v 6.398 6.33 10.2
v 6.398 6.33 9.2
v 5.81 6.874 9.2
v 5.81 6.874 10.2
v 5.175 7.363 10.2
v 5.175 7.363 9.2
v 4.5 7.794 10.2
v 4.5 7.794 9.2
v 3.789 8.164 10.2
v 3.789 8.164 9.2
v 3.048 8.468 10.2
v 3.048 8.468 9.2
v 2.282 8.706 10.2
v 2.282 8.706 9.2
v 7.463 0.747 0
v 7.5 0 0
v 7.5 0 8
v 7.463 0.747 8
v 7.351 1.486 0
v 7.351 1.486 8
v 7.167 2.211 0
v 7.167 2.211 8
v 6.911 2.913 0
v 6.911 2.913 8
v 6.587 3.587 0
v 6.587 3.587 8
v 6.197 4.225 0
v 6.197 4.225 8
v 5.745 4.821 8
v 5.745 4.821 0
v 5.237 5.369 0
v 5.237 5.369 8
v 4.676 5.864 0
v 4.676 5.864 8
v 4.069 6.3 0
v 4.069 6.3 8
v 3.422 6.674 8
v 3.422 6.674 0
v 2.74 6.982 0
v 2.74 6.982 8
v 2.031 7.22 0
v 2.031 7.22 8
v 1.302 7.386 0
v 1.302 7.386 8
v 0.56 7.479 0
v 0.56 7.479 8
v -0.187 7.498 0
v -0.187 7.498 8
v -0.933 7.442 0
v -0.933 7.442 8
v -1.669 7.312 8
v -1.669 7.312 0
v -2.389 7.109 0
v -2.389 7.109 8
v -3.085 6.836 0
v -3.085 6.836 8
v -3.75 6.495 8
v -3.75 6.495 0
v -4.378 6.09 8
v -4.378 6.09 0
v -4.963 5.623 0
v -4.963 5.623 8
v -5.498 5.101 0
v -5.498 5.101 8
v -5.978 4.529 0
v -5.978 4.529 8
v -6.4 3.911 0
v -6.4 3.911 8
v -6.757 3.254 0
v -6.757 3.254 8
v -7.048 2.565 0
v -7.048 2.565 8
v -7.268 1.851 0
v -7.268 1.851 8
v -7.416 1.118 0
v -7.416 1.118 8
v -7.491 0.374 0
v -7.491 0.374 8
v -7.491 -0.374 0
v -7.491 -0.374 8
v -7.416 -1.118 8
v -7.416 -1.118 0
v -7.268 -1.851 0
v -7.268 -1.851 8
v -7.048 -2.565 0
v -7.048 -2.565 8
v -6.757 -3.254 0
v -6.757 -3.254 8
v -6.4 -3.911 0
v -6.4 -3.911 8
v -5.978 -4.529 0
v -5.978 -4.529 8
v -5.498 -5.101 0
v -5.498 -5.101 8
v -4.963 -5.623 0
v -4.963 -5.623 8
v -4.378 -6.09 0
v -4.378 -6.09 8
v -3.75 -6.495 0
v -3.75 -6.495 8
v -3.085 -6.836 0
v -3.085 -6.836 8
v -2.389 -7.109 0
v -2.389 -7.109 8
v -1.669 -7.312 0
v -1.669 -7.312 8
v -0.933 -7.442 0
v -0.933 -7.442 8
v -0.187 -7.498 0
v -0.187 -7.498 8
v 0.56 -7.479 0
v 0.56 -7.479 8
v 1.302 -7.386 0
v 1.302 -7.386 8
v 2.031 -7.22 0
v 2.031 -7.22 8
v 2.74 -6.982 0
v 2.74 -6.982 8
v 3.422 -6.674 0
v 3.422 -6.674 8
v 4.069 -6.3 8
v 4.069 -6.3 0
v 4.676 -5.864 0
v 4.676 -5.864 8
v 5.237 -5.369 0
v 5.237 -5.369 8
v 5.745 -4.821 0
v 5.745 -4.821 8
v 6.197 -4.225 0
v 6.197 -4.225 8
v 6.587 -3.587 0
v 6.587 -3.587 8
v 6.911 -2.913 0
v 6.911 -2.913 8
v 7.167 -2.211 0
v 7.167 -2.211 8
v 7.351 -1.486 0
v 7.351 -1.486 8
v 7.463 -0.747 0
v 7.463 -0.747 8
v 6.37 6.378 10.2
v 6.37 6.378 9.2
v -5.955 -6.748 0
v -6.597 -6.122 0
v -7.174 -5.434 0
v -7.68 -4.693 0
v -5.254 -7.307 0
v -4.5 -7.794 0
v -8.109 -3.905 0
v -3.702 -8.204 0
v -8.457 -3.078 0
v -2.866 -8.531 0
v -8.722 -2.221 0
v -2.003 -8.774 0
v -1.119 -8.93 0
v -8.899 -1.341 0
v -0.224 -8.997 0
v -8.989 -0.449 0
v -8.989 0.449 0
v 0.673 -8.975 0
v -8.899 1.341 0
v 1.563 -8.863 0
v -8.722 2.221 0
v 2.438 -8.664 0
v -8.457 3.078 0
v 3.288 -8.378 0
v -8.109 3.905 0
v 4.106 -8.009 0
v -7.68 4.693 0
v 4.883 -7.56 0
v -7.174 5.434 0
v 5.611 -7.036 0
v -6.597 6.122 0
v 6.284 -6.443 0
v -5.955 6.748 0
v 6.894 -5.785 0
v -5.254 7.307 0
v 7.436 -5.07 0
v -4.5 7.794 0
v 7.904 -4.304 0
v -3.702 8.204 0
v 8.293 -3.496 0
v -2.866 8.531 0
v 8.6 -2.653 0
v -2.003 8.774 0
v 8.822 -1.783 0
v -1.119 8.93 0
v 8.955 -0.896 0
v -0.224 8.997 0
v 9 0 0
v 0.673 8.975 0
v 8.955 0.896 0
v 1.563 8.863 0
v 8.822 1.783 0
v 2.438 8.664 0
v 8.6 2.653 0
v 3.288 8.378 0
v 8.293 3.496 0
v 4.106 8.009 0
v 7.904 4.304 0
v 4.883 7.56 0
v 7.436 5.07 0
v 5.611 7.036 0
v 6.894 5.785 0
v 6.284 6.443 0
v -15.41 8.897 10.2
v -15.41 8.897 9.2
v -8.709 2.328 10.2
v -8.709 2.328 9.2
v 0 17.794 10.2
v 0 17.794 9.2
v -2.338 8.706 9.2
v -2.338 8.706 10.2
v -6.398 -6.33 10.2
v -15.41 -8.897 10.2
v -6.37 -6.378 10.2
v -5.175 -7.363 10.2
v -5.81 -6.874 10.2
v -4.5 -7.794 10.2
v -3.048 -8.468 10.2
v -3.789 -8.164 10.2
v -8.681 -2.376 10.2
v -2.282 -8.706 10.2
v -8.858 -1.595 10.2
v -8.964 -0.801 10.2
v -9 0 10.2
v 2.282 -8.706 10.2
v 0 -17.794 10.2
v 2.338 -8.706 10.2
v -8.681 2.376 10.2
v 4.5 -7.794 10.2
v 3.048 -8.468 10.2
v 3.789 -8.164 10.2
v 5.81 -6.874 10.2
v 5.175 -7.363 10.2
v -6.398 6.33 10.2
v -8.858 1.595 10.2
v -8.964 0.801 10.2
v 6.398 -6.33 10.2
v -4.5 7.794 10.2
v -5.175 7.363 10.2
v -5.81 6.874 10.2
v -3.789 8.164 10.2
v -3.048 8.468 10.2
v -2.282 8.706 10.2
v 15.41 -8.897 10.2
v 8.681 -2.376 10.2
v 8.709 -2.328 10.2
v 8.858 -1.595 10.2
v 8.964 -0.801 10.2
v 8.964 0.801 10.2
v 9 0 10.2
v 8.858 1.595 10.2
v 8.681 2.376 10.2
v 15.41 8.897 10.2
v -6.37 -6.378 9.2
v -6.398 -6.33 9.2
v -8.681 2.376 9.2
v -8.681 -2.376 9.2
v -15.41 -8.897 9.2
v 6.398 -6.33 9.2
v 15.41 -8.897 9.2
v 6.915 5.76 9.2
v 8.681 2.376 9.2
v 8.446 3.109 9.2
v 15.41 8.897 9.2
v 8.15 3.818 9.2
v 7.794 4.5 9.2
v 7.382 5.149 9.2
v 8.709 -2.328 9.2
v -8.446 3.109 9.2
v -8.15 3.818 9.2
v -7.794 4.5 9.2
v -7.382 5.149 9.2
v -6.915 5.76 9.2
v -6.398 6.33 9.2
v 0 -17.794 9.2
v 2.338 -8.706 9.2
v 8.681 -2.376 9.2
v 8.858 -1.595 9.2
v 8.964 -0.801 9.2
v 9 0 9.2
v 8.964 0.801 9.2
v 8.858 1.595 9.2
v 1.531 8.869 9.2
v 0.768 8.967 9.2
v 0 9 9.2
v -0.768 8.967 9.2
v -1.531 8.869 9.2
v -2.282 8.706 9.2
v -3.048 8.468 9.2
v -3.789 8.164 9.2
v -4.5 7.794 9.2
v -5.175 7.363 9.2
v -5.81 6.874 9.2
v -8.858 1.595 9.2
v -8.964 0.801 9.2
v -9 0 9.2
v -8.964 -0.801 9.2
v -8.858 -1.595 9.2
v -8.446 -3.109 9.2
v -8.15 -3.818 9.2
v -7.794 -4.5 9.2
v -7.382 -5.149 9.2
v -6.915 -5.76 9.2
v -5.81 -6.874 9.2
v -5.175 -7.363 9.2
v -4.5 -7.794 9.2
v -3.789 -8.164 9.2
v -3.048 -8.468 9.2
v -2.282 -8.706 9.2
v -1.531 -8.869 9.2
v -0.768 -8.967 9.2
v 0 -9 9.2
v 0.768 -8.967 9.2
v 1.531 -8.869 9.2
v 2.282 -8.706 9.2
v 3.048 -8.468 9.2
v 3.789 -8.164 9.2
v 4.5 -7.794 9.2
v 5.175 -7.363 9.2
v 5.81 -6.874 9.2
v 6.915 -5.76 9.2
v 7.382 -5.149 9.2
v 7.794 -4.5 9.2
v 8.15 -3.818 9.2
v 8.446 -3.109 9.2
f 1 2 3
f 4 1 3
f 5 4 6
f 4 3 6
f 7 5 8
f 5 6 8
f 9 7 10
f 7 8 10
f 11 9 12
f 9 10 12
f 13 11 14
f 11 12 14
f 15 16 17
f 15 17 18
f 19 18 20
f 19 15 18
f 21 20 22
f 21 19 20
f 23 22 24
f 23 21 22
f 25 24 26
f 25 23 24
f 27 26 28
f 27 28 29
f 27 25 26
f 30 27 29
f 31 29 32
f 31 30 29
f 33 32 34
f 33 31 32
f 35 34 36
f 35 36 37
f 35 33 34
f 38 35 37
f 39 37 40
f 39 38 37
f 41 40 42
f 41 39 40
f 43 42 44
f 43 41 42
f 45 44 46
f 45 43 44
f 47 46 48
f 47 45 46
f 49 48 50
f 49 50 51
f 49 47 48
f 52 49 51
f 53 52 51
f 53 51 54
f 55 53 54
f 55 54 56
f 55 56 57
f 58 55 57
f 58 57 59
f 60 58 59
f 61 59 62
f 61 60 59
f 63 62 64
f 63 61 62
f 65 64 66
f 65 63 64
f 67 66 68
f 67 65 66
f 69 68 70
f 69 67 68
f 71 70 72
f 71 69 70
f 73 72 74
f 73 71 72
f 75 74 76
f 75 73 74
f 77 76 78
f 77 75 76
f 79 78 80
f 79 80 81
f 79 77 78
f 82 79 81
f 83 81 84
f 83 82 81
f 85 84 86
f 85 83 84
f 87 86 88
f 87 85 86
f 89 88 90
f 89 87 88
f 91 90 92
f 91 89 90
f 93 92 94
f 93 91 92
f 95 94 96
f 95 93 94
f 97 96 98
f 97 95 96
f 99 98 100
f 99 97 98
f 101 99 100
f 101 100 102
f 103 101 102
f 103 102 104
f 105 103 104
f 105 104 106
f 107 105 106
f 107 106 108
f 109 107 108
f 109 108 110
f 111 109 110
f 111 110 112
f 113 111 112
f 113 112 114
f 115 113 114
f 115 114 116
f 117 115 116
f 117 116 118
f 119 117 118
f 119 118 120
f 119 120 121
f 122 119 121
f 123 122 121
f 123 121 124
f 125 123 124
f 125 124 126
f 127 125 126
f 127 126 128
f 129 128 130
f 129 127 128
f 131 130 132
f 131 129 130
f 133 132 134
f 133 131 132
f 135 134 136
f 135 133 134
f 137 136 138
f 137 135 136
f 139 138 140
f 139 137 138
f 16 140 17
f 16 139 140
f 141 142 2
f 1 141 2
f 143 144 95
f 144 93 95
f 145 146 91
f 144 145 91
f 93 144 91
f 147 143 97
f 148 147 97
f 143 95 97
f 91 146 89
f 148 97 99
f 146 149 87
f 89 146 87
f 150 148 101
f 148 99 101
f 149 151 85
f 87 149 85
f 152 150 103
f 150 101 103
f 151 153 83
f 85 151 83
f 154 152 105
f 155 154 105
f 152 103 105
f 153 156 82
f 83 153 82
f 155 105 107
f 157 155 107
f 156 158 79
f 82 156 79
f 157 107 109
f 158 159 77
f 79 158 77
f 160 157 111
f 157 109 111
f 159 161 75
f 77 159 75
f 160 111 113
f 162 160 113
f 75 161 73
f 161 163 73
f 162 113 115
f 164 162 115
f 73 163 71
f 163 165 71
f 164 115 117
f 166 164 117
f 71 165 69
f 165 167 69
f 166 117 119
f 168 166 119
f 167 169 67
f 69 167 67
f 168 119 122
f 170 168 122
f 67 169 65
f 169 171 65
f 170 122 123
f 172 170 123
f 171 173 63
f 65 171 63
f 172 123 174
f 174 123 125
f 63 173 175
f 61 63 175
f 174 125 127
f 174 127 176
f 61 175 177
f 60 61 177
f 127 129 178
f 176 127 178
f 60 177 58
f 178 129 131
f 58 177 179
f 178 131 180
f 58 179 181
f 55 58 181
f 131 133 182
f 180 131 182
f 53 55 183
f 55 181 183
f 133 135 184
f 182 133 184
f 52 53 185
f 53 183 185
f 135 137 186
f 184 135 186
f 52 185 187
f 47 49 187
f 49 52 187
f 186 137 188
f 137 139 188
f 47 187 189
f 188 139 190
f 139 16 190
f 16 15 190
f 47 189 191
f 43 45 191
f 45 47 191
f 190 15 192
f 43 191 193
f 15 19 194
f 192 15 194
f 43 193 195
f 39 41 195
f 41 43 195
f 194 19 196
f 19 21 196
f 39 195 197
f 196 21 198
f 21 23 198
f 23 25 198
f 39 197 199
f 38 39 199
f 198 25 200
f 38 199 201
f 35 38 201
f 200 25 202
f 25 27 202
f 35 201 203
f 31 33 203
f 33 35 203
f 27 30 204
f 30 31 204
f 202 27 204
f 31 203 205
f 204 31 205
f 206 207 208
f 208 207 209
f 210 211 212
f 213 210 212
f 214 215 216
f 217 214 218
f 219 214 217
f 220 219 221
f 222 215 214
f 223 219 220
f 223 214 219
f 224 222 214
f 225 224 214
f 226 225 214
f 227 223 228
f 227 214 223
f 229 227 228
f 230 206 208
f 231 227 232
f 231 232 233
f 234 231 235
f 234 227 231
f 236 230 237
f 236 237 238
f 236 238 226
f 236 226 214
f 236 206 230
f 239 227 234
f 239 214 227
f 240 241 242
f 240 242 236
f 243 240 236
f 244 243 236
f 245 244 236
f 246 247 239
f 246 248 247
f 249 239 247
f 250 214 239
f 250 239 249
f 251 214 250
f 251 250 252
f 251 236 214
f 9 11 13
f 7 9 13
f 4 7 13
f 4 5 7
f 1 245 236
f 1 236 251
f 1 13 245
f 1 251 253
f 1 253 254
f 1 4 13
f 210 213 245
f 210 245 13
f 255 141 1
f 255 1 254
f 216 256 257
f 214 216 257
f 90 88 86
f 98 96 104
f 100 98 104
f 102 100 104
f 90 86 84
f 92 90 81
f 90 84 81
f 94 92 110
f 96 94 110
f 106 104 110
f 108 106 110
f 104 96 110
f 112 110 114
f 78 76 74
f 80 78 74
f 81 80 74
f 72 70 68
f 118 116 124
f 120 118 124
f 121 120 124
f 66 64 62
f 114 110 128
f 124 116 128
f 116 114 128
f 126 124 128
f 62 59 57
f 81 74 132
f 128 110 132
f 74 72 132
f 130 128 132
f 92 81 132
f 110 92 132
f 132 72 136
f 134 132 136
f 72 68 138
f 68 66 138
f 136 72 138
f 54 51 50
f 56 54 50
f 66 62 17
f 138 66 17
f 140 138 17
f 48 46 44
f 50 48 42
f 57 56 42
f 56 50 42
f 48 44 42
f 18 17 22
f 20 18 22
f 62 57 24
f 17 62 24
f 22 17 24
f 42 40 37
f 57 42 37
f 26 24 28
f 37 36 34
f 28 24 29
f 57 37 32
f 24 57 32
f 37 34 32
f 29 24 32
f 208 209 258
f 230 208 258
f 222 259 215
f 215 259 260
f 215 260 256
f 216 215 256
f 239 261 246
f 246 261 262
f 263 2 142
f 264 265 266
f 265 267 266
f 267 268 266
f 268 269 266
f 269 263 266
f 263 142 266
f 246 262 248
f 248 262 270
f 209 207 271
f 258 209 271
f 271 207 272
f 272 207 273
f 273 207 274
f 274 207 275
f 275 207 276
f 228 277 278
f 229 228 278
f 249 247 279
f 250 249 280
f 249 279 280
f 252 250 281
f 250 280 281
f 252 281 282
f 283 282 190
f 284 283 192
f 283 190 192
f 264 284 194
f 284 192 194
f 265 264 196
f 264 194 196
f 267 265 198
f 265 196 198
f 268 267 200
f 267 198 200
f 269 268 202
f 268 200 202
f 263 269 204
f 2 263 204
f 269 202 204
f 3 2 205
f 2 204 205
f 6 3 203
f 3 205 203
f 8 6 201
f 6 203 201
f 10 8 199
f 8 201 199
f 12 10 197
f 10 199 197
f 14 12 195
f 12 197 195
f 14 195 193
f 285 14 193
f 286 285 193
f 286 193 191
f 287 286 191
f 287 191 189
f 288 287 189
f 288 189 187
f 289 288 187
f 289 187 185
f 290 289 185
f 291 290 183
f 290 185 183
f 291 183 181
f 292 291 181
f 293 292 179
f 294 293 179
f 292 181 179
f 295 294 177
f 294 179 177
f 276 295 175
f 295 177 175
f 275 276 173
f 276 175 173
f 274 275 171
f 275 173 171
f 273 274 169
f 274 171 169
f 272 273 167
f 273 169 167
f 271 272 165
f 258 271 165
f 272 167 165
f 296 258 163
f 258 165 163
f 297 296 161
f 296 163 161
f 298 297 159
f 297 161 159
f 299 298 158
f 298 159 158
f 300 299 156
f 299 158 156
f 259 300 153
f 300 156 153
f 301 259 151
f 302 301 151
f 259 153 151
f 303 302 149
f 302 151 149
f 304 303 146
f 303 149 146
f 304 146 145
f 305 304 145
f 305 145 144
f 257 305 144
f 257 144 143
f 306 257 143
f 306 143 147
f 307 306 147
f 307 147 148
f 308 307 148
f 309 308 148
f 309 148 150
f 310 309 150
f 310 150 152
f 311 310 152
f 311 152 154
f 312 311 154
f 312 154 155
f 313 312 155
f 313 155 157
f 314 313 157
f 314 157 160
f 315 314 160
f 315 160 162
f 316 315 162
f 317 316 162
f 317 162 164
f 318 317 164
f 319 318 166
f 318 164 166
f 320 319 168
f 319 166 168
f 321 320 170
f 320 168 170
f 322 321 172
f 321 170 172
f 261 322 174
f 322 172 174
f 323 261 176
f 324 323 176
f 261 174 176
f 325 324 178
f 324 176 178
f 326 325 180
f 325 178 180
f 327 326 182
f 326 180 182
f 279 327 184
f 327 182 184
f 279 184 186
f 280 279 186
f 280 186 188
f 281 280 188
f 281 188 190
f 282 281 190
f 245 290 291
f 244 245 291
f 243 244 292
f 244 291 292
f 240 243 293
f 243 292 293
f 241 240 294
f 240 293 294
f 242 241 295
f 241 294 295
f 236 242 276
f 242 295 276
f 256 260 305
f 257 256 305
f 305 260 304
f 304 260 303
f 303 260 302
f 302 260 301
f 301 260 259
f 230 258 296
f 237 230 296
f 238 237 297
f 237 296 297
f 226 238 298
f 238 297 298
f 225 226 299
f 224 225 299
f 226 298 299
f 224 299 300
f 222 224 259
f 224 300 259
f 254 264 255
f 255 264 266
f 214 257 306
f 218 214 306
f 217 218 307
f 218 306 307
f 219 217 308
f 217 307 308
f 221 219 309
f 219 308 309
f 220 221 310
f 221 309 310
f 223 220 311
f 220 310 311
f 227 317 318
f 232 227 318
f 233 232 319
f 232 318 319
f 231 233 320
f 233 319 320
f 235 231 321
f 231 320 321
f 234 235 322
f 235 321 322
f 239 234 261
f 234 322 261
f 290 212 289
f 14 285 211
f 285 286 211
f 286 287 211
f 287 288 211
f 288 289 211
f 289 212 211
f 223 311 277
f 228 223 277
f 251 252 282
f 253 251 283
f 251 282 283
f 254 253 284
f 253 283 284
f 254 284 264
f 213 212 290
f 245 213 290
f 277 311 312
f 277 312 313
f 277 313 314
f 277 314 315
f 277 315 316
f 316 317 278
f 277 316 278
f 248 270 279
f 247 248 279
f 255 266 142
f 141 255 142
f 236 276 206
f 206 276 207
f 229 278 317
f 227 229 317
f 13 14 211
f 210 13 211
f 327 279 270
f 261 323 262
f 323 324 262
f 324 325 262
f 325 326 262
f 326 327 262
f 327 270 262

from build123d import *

# Parameters (mm, degrees)
F0_R     = 9
F0_R_2   = 7.5
F1_DEPTH = 8
F2_R     = 9
F3_DEPTH = 1.2
F5_DEPTH = 1


with BuildPart() as f1:
    # F0 (on Top) → F1 (new body)
    with BuildSketch(Plane.XY):
        Circle(F0_R)
        Circle(F0_R_2, mode=Mode.SUBTRACT)
    extrude(amount=F1_DEPTH)

    # F2 (on face) → F3 (join)
    with BuildSketch(Plane.XY.offset(8)):
        Circle(F2_R)
    extrude(amount=F3_DEPTH)

    # F4 (on face) → F5 (join)
    with BuildSketch(Plane.XY.offset(9.2)):
        Polygon((0, 17.7935510874), (-2.3382310135, 8.7057620125), (2.2824784298, 8.7057620125), align=None)
        Polygon((-15.4096672652, 8.8967755437), (-8.7085265689, 2.3279135486), (-6.3981718472, 6.32956531), align=None)
        Polygon((-15.4096672652, -8.8967755437), (-6.3702955553, -6.3778484639), (-8.680650277, -2.3761967025), align=None)
        Polygon((0, -17.7935510874), (2.3382310135, -8.7057620125), (-2.2824784298, -8.7057620125), align=None)
        Polygon((15.4096672652, -8.8967755437), (8.7085265689, -2.3279135486), (6.3981718472, -6.32956531), align=None)
        Polygon((15.4096672652, 8.8967755437), (6.3702955553, 6.3778484639), (8.680650277, 2.3761967025), align=None)
        with BuildLine():
            Line((2.2824784298, 8.7057620125), (-2.2824784298, 8.7057620125))
            ThreePointArc((-2.2824784298, 8.7057620125), (-4.5, 7.7942286341), (-6.3981718472, 6.32956531))
            Line((-6.3981718472, 6.32956531), (-8.680650277, 2.3761967025))
            ThreePointArc((-8.680650277, 2.3761967025), (-9, 0), (-8.680650277, -2.3761967025))
            Line((-8.680650277, -2.3761967025), (-6.3981718472, -6.32956531))
            ThreePointArc((-6.3981718472, -6.32956531), (-4.5, -7.7942286341), (-2.2824784298, -8.7057620125))
            Line((-2.2824784298, -8.7057620125), (2.2824784298, -8.7057620125))
            ThreePointArc((2.2824784298, -8.7057620125), (4.5, -7.7942286341), (6.3981718472, -6.32956531))
            Line((6.3981718472, -6.32956531), (8.680650277, -2.3761967025))
            ThreePointArc((8.680650277, -2.3761967025), (8.9198052807, -1.1987801106), (9, 0))
            ThreePointArc((9, 0), (8.9198052807, 1.1987801106), (8.680650277, 2.3761967025))
            Line((8.680650277, 2.3761967025), (6.3981718472, 6.32956531))
            ThreePointArc((6.3981718472, 6.32956531), (4.5, 7.7942286341), (2.2824784298, 8.7057620125))
        make_face()
    extrude(amount=F5_DEPTH)


solid = f1.part
